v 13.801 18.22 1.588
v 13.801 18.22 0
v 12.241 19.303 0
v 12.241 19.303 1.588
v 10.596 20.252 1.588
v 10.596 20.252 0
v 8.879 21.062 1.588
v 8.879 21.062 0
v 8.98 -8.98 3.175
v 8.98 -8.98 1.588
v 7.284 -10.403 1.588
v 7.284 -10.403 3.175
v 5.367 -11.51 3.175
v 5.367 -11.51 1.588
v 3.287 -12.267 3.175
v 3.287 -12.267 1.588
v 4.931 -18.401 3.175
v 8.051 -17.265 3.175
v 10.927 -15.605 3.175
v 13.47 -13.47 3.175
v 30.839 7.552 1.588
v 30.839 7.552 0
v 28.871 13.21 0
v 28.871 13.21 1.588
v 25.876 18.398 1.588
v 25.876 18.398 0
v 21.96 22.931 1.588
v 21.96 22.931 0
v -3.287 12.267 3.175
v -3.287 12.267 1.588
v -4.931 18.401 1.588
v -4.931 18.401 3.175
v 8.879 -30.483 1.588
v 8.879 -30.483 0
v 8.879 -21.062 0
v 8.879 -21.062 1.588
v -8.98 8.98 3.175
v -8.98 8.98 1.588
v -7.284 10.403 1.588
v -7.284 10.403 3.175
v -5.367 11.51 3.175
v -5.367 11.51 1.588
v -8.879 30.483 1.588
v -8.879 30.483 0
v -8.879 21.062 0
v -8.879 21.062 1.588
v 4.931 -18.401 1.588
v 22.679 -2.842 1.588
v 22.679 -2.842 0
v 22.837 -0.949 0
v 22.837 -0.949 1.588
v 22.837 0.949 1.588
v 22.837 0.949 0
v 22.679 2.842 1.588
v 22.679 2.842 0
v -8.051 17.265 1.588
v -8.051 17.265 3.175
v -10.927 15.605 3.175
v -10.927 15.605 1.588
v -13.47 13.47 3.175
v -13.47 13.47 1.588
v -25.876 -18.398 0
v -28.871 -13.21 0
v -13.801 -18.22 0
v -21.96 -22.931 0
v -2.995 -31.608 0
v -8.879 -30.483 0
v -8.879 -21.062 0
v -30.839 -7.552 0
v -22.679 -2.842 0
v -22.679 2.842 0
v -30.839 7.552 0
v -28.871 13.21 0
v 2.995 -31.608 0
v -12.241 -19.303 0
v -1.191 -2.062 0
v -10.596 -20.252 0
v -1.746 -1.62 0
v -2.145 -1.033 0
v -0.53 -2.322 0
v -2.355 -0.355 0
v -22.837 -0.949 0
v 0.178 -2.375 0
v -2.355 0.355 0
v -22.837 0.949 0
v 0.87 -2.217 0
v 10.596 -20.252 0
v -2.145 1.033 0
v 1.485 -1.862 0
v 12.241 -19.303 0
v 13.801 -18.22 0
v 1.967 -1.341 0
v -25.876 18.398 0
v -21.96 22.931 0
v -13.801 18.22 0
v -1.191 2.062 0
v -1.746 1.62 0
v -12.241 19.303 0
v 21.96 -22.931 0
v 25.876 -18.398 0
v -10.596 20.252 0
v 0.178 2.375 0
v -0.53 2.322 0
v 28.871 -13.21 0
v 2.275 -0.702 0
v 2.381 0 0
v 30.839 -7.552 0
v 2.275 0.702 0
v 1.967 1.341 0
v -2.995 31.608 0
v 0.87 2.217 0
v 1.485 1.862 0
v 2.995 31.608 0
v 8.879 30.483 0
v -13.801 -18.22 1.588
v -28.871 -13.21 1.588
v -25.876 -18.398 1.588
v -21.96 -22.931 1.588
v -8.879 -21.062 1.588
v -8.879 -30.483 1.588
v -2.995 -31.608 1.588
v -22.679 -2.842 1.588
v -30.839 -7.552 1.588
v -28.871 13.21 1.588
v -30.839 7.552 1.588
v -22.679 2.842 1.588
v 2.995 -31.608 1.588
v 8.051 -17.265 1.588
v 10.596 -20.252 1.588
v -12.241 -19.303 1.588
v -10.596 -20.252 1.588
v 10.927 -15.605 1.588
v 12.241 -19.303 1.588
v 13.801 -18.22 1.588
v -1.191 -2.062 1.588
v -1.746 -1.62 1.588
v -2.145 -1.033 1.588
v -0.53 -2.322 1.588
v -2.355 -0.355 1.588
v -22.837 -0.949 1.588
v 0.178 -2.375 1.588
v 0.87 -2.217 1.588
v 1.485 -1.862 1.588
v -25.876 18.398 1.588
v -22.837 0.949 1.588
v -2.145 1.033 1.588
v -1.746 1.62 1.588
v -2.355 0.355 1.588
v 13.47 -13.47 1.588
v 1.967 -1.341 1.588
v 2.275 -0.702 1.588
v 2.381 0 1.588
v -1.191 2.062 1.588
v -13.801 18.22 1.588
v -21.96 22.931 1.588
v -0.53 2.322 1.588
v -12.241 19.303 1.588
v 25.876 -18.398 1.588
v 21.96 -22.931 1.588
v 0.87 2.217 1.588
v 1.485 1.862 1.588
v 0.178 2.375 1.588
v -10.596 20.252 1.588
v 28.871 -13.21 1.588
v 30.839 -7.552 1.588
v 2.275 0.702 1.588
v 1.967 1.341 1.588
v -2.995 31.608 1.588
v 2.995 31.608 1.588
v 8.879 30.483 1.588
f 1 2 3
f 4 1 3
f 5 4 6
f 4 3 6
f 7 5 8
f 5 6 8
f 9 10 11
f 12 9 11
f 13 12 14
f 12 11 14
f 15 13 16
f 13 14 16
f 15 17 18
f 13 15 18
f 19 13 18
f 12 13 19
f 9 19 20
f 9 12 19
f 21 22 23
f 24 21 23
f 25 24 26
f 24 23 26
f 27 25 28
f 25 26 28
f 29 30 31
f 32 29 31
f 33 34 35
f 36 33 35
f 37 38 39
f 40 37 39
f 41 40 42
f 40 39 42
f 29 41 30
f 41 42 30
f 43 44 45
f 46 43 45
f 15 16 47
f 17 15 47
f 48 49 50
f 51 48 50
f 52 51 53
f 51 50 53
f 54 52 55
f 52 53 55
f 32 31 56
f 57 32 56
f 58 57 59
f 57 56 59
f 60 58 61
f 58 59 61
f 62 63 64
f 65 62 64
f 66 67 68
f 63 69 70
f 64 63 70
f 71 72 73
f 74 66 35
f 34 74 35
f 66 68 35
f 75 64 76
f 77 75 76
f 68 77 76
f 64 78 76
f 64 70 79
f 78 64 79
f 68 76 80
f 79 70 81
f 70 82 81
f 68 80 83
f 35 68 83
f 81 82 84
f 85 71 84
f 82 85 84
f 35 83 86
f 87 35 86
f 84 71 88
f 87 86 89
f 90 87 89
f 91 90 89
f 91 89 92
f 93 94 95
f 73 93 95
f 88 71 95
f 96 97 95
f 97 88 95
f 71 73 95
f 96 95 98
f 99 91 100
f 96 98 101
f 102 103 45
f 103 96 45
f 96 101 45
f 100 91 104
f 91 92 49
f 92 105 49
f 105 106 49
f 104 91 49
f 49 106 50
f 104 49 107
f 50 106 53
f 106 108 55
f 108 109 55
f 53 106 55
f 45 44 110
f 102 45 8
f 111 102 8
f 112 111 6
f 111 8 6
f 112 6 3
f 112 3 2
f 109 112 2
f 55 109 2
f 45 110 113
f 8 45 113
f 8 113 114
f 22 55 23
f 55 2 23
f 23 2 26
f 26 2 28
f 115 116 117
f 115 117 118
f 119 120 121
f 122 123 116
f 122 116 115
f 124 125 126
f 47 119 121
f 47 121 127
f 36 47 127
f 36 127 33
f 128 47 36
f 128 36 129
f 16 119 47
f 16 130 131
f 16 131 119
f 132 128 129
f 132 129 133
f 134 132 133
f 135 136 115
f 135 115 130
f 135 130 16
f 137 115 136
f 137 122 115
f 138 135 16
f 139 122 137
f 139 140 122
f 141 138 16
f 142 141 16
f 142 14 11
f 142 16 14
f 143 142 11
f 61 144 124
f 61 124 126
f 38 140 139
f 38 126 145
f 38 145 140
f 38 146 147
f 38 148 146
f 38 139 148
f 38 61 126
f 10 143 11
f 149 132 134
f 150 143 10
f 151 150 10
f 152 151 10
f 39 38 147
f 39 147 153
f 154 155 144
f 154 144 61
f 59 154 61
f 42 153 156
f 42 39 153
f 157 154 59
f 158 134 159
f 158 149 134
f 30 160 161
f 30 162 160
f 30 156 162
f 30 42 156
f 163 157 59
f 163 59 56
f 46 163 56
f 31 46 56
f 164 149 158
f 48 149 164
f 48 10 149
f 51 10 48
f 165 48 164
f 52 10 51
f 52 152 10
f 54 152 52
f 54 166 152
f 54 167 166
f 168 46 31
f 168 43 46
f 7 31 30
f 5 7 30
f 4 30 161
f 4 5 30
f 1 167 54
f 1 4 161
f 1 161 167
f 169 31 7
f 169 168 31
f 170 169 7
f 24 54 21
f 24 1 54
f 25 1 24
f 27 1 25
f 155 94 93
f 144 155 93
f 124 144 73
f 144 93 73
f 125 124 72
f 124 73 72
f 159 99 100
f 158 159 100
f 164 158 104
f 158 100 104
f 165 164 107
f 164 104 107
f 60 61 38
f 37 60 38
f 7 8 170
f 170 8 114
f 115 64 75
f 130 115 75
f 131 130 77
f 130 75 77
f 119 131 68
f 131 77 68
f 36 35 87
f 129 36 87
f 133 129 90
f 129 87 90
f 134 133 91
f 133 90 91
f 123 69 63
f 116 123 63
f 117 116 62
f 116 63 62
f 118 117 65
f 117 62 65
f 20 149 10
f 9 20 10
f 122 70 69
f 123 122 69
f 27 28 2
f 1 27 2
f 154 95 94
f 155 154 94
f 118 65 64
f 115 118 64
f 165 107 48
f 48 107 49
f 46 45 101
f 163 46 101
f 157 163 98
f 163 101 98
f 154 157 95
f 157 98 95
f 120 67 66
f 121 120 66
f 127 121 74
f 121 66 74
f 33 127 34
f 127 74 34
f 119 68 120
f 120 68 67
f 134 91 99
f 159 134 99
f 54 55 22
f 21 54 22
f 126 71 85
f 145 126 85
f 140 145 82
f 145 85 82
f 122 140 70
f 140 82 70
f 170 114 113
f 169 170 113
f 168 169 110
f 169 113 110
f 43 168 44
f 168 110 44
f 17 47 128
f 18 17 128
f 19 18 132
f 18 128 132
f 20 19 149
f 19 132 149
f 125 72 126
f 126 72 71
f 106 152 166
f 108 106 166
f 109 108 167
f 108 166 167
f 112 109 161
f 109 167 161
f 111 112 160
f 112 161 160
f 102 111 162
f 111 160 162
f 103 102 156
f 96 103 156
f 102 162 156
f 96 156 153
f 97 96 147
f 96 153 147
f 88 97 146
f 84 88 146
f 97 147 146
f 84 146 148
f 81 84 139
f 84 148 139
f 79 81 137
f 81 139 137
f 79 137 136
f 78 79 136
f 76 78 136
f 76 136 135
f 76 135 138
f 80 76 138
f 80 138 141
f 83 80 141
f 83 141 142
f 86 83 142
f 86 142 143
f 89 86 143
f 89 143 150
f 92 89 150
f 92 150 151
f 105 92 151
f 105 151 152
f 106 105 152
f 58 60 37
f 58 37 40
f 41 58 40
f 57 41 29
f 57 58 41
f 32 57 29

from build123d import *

# Parameters (mm, degrees)
EXTRUDE1_DEPTH      = 1.5875
SKETCH2_R           = 2.38125
CUT_EXTRUDE1_DEPTH  = 2.5875
BOSS_EXTRUDE1_DEPTH = 1.5875


with BuildPart() as part:
    # Sketch1 → Extrude1 (new body)
    with BuildSketch(Plane.XY):
        with BuildLine():
            Line((22.679380466, 2.841623674), (30.838674439, 7.552394246))
            ThreePointArc((30.838674439, 7.552394246), (27.49630657, 15.875), (21.959902496, 22.93087836))
            Line((21.959902496, 22.93087836), (13.800608523, 18.220107788))
            ThreePointArc((13.800608523, 18.220107788), (11.428354249, 19.794490207), (8.878771943, 21.061731462))
            Line((8.878771943, 21.061731462), (8.878771943, 30.483272606))
            ThreePointArc((8.878771943, 30.483272606), (0, 31.75), (-8.878771943, 30.483272606))
            Line((-8.878771943, 30.483272606), (-8.878771943, 21.061731462))
            ThreePointArc((-8.878771943, 21.061731462), (-11.42835425, 19.794490207), (-13.800608523, 18.220107788))
            Line((-13.800608523, 18.220107788), (-21.959902496, 22.93087836))
            ThreePointArc((-21.959902496, 22.93087836), (-27.49630657, 15.875), (-30.838674439, 7.552394246))
            Line((-30.838674439, 7.552394246), (-22.679380466, 2.841623674))
            ThreePointArc((-22.679380466, 2.841623674), (-22.856708499, 0), (-22.679380466, -2.841623674))
            Line((-22.679380466, -2.841623674), (-30.838674439, -7.552394246))
            ThreePointArc((-30.838674439, -7.552394246), (-27.49630657, -15.875), (-21.959902496, -22.93087836))
            Line((-21.959902496, -22.93087836), (-13.800608523, -18.220107788))
            ThreePointArc((-13.800608523, -18.220107788), (-11.428354249, -19.794490207), (-8.878771943, -21.061731462))
            Line((-8.878771943, -21.061731462), (-8.878771943, -30.483272606))
            ThreePointArc((-8.878771943, -30.483272606), (0, -31.75), (8.878771943, -30.483272606))
            Line((8.878771943, -30.483272606), (8.878771943, -21.061731462))
            ThreePointArc((8.878771943, -21.061731462), (11.42835425, -19.794490207), (13.800608523, -18.220107788))
            Line((13.800608523, -18.220107788), (21.959902496, -22.93087836))
            ThreePointArc((21.959902496, -22.93087836), (27.49630657, -15.875), (30.838674439, -7.552394246))
            Line((30.838674439, -7.552394246), (22.679380466, -2.841623674))
            ThreePointArc((22.679380466, -2.841623674), (22.856708499, 0), (22.679380466, 2.841623674))
        make_face()
    extrude(amount=EXTRUDE1_DEPTH)

    # Sketch2 → Cut-Extrude1 (cut, through all)
    with BuildSketch(Plane.XY.offset(1.5875)):
        Circle(SKETCH2_R)
    extrude(amount=-CUT_EXTRUDE1_DEPTH, mode=Mode.SUBTRACT)

    # Sketch3 → Boss-Extrude1 (add)
    with BuildSketch(Plane.XY.offset(1.5875)):
        with BuildLine():
            Line((-13.470384182, 13.470384182), (-8.980256121, 8.980256121))
            ThreePointArc((-8.980256121, 8.980256121), (-6.35, 10.998522628), (-3.287001873, 12.267257994))
            Line((-3.287001873, 12.267257994), (-4.930502809, 18.400886991))
            ThreePointArc((-4.930502809, 18.400886991), (-9.525, 16.497783942), (-13.470384182, 13.470384182))
        make_face()
        with BuildLine():
            Line((13.470384182, -13.470384182), (8.980256121, -8.980256121))
            ThreePointArc((8.980256121, -8.980256121), (6.35, -10.998522628), (3.287001873, -12.267257994))
            Line((3.287001873, -12.267257994), (4.930502809, -18.400886991))
            ThreePointArc((4.930502809, -18.400886991), (9.525, -16.497783942), (13.470384182, -13.470384182))
        make_face()
    extrude(amount=BOSS_EXTRUDE1_DEPTH)


solid = part.part
